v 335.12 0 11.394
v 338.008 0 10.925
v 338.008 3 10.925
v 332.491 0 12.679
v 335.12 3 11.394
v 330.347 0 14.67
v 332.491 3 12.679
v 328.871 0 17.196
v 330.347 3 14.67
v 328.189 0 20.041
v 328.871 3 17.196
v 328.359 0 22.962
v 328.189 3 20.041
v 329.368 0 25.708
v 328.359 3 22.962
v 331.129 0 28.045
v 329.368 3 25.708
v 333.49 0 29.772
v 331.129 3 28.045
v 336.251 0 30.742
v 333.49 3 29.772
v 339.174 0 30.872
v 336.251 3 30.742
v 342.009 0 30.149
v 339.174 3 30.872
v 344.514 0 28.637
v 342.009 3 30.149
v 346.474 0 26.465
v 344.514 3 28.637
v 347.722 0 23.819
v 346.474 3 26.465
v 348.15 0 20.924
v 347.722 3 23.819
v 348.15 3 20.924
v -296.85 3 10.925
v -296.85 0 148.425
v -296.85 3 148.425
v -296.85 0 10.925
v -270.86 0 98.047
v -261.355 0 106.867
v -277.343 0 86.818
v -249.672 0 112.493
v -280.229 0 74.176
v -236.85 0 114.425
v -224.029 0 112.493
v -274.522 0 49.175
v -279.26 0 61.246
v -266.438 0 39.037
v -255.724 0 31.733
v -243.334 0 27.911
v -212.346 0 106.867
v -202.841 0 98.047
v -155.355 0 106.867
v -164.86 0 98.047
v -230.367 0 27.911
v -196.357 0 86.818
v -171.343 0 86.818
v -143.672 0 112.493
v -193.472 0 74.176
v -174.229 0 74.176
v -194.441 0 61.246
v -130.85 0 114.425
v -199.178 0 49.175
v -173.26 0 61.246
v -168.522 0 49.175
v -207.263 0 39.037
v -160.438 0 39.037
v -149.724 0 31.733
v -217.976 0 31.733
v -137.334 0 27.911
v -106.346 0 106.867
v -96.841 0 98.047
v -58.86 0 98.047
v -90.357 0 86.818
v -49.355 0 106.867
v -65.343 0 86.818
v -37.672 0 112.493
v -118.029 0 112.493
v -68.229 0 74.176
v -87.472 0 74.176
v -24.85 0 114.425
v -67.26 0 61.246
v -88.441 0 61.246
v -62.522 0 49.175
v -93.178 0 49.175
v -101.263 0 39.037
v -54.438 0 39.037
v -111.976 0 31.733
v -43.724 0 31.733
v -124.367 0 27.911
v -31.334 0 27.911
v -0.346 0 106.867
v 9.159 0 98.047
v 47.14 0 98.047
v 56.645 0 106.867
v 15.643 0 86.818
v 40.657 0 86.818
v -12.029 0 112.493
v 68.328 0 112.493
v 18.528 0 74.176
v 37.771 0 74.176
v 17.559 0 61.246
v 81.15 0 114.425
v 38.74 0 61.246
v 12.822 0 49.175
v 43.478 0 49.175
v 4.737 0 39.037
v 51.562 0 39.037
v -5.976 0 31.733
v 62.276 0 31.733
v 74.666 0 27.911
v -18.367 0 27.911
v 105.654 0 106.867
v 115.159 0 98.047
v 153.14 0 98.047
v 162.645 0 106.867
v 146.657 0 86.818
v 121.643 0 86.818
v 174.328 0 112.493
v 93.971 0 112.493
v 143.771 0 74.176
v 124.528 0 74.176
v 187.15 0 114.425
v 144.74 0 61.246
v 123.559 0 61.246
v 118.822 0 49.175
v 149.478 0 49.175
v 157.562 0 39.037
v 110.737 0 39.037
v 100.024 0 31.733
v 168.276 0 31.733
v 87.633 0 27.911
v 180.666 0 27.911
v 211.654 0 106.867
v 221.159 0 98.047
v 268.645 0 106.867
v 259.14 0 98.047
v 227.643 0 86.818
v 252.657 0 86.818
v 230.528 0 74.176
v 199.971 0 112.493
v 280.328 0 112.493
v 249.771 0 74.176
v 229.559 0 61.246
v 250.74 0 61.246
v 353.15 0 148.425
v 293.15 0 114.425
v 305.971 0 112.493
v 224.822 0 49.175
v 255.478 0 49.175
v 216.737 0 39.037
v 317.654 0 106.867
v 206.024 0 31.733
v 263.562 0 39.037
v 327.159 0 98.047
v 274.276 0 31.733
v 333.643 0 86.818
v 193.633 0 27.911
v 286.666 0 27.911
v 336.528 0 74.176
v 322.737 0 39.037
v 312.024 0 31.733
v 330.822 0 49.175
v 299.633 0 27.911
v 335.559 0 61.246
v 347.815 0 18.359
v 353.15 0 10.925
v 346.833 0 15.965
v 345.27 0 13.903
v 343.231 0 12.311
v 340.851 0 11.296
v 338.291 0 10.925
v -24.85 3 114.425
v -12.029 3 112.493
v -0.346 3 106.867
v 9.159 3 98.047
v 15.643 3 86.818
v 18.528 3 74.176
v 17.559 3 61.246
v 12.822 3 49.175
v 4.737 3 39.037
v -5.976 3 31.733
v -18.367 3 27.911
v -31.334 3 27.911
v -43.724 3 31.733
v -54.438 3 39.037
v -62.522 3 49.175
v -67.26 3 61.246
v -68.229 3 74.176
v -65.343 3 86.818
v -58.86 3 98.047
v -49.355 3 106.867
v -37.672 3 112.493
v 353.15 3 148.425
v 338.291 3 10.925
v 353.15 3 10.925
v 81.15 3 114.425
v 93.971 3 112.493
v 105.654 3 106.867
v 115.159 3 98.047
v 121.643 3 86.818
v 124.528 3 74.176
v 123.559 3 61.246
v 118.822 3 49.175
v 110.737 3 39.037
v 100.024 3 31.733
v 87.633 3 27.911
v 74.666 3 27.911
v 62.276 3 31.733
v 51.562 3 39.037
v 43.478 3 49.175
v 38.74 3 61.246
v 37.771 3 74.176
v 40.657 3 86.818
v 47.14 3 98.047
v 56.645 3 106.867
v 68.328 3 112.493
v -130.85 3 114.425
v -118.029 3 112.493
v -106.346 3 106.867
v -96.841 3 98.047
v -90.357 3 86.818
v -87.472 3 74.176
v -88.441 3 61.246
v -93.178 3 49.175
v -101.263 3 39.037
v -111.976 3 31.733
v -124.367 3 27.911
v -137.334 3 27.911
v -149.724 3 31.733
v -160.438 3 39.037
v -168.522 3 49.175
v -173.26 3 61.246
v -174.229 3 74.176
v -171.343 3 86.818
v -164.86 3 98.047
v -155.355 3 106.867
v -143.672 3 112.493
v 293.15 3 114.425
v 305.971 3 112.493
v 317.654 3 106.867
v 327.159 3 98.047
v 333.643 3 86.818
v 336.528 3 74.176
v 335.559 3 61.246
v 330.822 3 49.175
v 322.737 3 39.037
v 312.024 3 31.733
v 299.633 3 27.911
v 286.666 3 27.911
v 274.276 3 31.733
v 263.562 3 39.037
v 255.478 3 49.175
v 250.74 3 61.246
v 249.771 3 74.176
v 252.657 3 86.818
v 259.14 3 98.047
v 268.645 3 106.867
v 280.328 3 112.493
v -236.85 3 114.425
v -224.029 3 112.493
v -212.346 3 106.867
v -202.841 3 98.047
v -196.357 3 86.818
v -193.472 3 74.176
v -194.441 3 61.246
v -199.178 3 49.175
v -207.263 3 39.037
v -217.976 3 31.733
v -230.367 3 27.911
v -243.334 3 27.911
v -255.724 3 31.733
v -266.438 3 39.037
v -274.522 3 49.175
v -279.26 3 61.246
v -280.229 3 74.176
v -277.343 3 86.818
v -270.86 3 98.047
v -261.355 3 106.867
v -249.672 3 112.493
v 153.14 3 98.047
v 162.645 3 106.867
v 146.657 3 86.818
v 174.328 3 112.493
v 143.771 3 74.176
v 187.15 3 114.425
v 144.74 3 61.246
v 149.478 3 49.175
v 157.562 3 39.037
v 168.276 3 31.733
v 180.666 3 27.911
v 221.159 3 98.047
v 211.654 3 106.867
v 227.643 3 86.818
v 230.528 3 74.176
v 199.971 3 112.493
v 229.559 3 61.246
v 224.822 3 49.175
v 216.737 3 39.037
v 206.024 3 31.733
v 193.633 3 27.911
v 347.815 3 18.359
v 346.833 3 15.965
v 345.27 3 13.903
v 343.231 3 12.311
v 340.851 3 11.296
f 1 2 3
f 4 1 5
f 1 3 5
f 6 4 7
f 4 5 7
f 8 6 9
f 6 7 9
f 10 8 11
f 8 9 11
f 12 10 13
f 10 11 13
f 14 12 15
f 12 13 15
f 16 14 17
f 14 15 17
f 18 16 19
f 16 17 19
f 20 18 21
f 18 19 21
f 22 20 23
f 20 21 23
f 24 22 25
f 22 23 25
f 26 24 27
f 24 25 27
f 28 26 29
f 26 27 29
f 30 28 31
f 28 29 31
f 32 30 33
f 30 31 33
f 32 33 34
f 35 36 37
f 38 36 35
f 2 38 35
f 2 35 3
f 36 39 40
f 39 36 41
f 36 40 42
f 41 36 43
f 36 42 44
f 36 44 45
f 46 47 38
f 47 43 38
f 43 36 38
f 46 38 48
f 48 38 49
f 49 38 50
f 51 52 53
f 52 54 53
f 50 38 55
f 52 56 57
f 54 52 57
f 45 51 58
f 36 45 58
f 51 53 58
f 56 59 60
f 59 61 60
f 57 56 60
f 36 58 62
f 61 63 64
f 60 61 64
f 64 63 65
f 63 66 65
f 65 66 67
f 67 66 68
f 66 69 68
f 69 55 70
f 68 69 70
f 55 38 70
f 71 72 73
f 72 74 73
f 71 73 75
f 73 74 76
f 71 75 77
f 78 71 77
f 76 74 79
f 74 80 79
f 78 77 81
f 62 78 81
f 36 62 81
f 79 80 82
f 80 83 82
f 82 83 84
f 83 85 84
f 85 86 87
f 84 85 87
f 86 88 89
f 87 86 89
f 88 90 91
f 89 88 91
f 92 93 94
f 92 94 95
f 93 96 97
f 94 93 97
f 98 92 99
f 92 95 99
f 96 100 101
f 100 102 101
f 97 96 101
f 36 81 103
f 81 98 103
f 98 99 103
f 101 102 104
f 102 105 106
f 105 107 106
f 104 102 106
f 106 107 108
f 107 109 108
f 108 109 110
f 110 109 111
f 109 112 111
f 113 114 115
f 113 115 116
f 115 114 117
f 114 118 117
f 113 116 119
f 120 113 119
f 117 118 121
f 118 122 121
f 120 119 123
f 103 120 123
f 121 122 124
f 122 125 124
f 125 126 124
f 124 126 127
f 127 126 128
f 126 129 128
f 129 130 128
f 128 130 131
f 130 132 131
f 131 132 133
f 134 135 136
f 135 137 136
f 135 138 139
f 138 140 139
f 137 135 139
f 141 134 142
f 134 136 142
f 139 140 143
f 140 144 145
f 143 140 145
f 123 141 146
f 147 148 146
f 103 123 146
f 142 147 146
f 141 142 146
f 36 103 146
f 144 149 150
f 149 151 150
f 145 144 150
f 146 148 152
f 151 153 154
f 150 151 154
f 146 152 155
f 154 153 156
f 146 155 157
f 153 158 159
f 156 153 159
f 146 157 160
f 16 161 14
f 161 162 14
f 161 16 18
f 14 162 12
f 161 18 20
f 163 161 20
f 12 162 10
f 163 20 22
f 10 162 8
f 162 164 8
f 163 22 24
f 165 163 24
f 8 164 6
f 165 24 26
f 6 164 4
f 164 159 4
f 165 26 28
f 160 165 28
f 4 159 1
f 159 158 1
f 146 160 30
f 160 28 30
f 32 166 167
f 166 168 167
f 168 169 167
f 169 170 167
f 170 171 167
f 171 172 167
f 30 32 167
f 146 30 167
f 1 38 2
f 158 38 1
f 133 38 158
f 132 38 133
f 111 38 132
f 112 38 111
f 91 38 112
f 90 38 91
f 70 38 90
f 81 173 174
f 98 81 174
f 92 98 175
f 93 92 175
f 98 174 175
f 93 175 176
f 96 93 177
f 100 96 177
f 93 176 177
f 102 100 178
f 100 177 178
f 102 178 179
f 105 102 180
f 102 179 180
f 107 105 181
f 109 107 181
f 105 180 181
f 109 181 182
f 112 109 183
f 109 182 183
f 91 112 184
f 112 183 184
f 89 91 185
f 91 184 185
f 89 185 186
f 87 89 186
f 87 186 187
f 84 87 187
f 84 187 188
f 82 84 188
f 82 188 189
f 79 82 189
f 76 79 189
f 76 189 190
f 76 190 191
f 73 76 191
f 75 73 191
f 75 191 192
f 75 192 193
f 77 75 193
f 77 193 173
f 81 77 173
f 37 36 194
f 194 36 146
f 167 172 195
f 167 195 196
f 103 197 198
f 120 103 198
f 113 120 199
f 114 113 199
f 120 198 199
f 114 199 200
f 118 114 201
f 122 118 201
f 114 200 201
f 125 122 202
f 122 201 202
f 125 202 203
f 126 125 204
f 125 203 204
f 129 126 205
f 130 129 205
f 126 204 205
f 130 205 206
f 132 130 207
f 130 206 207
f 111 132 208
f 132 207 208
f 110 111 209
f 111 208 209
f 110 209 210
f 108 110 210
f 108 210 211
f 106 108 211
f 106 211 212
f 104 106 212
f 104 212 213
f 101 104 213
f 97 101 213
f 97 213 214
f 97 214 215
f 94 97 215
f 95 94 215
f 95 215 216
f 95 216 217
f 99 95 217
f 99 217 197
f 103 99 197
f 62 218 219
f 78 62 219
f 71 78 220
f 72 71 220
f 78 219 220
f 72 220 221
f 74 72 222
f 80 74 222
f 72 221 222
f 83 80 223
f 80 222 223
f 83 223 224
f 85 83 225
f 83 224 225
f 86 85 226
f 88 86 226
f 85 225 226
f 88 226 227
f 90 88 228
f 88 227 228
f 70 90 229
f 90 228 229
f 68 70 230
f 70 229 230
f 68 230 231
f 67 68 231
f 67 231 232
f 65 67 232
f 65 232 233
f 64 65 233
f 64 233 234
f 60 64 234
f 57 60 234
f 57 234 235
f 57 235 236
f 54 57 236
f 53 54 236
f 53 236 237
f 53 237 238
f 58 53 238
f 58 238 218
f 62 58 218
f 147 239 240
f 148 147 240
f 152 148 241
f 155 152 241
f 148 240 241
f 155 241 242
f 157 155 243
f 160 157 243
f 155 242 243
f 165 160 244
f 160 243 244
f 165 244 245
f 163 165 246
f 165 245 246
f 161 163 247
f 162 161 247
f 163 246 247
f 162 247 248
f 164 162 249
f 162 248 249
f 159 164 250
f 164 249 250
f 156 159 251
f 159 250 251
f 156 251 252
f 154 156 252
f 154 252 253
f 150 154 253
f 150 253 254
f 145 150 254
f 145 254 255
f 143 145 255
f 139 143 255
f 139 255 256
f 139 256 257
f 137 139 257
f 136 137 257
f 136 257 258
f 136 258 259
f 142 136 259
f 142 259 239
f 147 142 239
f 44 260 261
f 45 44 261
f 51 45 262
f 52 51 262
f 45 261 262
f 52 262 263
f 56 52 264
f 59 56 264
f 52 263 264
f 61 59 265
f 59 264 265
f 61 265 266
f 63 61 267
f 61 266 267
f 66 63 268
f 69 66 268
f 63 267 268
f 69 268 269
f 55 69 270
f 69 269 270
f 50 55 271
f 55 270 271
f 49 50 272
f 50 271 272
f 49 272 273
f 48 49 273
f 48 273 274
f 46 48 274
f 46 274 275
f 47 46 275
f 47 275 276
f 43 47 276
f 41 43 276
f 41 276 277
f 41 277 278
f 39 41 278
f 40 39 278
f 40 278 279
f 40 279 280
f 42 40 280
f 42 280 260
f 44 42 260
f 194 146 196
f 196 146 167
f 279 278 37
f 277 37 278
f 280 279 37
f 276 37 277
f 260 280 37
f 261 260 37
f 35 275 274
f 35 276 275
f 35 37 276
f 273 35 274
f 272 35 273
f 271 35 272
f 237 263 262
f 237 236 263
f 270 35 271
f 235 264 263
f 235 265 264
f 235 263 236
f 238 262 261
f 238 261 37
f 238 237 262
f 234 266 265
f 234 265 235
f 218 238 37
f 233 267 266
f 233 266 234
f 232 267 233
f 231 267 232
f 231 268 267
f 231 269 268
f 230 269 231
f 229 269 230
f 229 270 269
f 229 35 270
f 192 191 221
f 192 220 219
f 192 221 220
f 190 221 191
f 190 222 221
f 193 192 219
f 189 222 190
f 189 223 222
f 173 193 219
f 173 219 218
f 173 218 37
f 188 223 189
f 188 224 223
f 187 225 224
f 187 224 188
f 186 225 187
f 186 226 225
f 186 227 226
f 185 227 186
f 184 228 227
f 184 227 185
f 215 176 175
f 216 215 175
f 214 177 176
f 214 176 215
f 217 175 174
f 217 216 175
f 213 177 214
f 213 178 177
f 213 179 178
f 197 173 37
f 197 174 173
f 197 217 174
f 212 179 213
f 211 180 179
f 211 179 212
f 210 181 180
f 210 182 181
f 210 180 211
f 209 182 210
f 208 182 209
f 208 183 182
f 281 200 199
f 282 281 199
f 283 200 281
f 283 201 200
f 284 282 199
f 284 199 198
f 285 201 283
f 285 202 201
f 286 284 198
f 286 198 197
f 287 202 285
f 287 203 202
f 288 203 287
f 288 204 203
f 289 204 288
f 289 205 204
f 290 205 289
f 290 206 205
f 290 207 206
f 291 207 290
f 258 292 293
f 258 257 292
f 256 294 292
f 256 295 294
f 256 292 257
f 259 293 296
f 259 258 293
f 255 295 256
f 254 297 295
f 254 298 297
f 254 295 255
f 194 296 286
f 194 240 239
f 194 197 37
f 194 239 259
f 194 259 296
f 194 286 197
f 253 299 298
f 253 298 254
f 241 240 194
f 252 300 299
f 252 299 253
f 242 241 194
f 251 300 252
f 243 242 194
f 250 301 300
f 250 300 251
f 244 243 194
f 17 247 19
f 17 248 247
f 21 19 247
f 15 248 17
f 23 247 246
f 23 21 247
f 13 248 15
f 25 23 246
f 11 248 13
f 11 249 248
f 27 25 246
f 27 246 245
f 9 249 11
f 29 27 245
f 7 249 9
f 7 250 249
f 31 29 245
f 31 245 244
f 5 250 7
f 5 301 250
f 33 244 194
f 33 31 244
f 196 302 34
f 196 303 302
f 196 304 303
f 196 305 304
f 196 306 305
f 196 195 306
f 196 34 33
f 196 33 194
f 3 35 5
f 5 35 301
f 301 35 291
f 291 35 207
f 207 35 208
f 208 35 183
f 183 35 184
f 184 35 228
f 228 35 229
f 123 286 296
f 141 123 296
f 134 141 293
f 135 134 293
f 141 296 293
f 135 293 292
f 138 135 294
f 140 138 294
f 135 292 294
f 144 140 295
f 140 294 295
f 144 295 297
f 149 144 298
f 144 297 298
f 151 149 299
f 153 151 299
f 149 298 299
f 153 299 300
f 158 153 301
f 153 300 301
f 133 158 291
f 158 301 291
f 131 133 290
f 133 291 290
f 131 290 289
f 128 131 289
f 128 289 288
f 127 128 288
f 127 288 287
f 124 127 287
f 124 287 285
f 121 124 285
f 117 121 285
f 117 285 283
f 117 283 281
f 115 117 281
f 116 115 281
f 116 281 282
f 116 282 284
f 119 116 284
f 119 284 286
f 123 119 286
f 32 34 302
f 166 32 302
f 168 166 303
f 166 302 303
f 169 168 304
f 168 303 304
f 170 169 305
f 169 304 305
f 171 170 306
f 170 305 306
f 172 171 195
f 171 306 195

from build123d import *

# Parameters (mm, degrees)
SKETCH1_W           = 650
SKETCH1_H           = 137.5
BOSS_EXTRUDE1_DEPTH = 3
SKETCH2_R           = 43.5
CUT_EXTRUDE1_DEPTH  = 384.084433891
SKETCH2_3_R         = 43.5
SKETCH2_3_R_2       = 10
CUT_EXTRUDE2_DEPTH  = 10


with BuildPart() as part:
    # Sketch1 → Boss-Extrude1 (new body)
    with BuildSketch(Plane(origin=(0, 0, 0), x_dir=(1, 0, 0), z_dir=(0, 1, 0))):
        with Locations((28.149606299, -79.67519685)):
            Rectangle(SKETCH1_W, SKETCH1_H)
    extrude(amount=BOSS_EXTRUDE1_DEPTH)

    # Sketch2 → Cut-Extrude1 (cut, through all)
    with BuildSketch(Plane(origin=(0, 3, 0), x_dir=(1, 0, 0), z_dir=(0, 1, 0))):
        with Locations((-236.850393701, -70.92519685)):
            Circle(SKETCH2_R)
        with Locations((-130.850393701, -70.92519685)):
            Circle(SKETCH2_R)
        with Locations((-24.850393701, -70.92519685)):
            Circle(SKETCH2_R)
        with Locations((81.149606299, -70.92519685)):
            Circle(SKETCH2_R)
        with Locations((187.149606299, -70.92519685)):
            Circle(SKETCH2_R)
        with Locations((293.149606299, -70.92519685)):
            Circle(SKETCH2_R)
    extrude(amount=-CUT_EXTRUDE1_DEPTH, mode=Mode.SUBTRACT)

    # Sketch2<3> → Cut-Extrude2 (cut)
    with BuildSketch(Plane(origin=(0, 3, 0), x_dir=(1, 0, 0), z_dir=(0, 1, 0))):
        with Locations((-236.850393701, -70.92519685)):
            Circle(SKETCH2_3_R)
        with Locations((-130.850393701, -70.92519685)):
            Circle(SKETCH2_3_R)
        with Locations((-24.850393701, -70.92519685)):
            Circle(SKETCH2_3_R)
        with Locations((81.149606299, -70.92519685)):
            Circle(SKETCH2_3_R)
        with Locations((187.149606299, -70.92519685)):
            Circle(SKETCH2_3_R)
        with Locations((293.149606299, -70.92519685)):
            Circle(SKETCH2_3_R)
        with Locations((338.149606299, -20.92419685)):
            Circle(SKETCH2_3_R_2)
    extrude(amount=-CUT_EXTRUDE2_DEPTH, mode=Mode.SUBTRACT)


solid = part.part
